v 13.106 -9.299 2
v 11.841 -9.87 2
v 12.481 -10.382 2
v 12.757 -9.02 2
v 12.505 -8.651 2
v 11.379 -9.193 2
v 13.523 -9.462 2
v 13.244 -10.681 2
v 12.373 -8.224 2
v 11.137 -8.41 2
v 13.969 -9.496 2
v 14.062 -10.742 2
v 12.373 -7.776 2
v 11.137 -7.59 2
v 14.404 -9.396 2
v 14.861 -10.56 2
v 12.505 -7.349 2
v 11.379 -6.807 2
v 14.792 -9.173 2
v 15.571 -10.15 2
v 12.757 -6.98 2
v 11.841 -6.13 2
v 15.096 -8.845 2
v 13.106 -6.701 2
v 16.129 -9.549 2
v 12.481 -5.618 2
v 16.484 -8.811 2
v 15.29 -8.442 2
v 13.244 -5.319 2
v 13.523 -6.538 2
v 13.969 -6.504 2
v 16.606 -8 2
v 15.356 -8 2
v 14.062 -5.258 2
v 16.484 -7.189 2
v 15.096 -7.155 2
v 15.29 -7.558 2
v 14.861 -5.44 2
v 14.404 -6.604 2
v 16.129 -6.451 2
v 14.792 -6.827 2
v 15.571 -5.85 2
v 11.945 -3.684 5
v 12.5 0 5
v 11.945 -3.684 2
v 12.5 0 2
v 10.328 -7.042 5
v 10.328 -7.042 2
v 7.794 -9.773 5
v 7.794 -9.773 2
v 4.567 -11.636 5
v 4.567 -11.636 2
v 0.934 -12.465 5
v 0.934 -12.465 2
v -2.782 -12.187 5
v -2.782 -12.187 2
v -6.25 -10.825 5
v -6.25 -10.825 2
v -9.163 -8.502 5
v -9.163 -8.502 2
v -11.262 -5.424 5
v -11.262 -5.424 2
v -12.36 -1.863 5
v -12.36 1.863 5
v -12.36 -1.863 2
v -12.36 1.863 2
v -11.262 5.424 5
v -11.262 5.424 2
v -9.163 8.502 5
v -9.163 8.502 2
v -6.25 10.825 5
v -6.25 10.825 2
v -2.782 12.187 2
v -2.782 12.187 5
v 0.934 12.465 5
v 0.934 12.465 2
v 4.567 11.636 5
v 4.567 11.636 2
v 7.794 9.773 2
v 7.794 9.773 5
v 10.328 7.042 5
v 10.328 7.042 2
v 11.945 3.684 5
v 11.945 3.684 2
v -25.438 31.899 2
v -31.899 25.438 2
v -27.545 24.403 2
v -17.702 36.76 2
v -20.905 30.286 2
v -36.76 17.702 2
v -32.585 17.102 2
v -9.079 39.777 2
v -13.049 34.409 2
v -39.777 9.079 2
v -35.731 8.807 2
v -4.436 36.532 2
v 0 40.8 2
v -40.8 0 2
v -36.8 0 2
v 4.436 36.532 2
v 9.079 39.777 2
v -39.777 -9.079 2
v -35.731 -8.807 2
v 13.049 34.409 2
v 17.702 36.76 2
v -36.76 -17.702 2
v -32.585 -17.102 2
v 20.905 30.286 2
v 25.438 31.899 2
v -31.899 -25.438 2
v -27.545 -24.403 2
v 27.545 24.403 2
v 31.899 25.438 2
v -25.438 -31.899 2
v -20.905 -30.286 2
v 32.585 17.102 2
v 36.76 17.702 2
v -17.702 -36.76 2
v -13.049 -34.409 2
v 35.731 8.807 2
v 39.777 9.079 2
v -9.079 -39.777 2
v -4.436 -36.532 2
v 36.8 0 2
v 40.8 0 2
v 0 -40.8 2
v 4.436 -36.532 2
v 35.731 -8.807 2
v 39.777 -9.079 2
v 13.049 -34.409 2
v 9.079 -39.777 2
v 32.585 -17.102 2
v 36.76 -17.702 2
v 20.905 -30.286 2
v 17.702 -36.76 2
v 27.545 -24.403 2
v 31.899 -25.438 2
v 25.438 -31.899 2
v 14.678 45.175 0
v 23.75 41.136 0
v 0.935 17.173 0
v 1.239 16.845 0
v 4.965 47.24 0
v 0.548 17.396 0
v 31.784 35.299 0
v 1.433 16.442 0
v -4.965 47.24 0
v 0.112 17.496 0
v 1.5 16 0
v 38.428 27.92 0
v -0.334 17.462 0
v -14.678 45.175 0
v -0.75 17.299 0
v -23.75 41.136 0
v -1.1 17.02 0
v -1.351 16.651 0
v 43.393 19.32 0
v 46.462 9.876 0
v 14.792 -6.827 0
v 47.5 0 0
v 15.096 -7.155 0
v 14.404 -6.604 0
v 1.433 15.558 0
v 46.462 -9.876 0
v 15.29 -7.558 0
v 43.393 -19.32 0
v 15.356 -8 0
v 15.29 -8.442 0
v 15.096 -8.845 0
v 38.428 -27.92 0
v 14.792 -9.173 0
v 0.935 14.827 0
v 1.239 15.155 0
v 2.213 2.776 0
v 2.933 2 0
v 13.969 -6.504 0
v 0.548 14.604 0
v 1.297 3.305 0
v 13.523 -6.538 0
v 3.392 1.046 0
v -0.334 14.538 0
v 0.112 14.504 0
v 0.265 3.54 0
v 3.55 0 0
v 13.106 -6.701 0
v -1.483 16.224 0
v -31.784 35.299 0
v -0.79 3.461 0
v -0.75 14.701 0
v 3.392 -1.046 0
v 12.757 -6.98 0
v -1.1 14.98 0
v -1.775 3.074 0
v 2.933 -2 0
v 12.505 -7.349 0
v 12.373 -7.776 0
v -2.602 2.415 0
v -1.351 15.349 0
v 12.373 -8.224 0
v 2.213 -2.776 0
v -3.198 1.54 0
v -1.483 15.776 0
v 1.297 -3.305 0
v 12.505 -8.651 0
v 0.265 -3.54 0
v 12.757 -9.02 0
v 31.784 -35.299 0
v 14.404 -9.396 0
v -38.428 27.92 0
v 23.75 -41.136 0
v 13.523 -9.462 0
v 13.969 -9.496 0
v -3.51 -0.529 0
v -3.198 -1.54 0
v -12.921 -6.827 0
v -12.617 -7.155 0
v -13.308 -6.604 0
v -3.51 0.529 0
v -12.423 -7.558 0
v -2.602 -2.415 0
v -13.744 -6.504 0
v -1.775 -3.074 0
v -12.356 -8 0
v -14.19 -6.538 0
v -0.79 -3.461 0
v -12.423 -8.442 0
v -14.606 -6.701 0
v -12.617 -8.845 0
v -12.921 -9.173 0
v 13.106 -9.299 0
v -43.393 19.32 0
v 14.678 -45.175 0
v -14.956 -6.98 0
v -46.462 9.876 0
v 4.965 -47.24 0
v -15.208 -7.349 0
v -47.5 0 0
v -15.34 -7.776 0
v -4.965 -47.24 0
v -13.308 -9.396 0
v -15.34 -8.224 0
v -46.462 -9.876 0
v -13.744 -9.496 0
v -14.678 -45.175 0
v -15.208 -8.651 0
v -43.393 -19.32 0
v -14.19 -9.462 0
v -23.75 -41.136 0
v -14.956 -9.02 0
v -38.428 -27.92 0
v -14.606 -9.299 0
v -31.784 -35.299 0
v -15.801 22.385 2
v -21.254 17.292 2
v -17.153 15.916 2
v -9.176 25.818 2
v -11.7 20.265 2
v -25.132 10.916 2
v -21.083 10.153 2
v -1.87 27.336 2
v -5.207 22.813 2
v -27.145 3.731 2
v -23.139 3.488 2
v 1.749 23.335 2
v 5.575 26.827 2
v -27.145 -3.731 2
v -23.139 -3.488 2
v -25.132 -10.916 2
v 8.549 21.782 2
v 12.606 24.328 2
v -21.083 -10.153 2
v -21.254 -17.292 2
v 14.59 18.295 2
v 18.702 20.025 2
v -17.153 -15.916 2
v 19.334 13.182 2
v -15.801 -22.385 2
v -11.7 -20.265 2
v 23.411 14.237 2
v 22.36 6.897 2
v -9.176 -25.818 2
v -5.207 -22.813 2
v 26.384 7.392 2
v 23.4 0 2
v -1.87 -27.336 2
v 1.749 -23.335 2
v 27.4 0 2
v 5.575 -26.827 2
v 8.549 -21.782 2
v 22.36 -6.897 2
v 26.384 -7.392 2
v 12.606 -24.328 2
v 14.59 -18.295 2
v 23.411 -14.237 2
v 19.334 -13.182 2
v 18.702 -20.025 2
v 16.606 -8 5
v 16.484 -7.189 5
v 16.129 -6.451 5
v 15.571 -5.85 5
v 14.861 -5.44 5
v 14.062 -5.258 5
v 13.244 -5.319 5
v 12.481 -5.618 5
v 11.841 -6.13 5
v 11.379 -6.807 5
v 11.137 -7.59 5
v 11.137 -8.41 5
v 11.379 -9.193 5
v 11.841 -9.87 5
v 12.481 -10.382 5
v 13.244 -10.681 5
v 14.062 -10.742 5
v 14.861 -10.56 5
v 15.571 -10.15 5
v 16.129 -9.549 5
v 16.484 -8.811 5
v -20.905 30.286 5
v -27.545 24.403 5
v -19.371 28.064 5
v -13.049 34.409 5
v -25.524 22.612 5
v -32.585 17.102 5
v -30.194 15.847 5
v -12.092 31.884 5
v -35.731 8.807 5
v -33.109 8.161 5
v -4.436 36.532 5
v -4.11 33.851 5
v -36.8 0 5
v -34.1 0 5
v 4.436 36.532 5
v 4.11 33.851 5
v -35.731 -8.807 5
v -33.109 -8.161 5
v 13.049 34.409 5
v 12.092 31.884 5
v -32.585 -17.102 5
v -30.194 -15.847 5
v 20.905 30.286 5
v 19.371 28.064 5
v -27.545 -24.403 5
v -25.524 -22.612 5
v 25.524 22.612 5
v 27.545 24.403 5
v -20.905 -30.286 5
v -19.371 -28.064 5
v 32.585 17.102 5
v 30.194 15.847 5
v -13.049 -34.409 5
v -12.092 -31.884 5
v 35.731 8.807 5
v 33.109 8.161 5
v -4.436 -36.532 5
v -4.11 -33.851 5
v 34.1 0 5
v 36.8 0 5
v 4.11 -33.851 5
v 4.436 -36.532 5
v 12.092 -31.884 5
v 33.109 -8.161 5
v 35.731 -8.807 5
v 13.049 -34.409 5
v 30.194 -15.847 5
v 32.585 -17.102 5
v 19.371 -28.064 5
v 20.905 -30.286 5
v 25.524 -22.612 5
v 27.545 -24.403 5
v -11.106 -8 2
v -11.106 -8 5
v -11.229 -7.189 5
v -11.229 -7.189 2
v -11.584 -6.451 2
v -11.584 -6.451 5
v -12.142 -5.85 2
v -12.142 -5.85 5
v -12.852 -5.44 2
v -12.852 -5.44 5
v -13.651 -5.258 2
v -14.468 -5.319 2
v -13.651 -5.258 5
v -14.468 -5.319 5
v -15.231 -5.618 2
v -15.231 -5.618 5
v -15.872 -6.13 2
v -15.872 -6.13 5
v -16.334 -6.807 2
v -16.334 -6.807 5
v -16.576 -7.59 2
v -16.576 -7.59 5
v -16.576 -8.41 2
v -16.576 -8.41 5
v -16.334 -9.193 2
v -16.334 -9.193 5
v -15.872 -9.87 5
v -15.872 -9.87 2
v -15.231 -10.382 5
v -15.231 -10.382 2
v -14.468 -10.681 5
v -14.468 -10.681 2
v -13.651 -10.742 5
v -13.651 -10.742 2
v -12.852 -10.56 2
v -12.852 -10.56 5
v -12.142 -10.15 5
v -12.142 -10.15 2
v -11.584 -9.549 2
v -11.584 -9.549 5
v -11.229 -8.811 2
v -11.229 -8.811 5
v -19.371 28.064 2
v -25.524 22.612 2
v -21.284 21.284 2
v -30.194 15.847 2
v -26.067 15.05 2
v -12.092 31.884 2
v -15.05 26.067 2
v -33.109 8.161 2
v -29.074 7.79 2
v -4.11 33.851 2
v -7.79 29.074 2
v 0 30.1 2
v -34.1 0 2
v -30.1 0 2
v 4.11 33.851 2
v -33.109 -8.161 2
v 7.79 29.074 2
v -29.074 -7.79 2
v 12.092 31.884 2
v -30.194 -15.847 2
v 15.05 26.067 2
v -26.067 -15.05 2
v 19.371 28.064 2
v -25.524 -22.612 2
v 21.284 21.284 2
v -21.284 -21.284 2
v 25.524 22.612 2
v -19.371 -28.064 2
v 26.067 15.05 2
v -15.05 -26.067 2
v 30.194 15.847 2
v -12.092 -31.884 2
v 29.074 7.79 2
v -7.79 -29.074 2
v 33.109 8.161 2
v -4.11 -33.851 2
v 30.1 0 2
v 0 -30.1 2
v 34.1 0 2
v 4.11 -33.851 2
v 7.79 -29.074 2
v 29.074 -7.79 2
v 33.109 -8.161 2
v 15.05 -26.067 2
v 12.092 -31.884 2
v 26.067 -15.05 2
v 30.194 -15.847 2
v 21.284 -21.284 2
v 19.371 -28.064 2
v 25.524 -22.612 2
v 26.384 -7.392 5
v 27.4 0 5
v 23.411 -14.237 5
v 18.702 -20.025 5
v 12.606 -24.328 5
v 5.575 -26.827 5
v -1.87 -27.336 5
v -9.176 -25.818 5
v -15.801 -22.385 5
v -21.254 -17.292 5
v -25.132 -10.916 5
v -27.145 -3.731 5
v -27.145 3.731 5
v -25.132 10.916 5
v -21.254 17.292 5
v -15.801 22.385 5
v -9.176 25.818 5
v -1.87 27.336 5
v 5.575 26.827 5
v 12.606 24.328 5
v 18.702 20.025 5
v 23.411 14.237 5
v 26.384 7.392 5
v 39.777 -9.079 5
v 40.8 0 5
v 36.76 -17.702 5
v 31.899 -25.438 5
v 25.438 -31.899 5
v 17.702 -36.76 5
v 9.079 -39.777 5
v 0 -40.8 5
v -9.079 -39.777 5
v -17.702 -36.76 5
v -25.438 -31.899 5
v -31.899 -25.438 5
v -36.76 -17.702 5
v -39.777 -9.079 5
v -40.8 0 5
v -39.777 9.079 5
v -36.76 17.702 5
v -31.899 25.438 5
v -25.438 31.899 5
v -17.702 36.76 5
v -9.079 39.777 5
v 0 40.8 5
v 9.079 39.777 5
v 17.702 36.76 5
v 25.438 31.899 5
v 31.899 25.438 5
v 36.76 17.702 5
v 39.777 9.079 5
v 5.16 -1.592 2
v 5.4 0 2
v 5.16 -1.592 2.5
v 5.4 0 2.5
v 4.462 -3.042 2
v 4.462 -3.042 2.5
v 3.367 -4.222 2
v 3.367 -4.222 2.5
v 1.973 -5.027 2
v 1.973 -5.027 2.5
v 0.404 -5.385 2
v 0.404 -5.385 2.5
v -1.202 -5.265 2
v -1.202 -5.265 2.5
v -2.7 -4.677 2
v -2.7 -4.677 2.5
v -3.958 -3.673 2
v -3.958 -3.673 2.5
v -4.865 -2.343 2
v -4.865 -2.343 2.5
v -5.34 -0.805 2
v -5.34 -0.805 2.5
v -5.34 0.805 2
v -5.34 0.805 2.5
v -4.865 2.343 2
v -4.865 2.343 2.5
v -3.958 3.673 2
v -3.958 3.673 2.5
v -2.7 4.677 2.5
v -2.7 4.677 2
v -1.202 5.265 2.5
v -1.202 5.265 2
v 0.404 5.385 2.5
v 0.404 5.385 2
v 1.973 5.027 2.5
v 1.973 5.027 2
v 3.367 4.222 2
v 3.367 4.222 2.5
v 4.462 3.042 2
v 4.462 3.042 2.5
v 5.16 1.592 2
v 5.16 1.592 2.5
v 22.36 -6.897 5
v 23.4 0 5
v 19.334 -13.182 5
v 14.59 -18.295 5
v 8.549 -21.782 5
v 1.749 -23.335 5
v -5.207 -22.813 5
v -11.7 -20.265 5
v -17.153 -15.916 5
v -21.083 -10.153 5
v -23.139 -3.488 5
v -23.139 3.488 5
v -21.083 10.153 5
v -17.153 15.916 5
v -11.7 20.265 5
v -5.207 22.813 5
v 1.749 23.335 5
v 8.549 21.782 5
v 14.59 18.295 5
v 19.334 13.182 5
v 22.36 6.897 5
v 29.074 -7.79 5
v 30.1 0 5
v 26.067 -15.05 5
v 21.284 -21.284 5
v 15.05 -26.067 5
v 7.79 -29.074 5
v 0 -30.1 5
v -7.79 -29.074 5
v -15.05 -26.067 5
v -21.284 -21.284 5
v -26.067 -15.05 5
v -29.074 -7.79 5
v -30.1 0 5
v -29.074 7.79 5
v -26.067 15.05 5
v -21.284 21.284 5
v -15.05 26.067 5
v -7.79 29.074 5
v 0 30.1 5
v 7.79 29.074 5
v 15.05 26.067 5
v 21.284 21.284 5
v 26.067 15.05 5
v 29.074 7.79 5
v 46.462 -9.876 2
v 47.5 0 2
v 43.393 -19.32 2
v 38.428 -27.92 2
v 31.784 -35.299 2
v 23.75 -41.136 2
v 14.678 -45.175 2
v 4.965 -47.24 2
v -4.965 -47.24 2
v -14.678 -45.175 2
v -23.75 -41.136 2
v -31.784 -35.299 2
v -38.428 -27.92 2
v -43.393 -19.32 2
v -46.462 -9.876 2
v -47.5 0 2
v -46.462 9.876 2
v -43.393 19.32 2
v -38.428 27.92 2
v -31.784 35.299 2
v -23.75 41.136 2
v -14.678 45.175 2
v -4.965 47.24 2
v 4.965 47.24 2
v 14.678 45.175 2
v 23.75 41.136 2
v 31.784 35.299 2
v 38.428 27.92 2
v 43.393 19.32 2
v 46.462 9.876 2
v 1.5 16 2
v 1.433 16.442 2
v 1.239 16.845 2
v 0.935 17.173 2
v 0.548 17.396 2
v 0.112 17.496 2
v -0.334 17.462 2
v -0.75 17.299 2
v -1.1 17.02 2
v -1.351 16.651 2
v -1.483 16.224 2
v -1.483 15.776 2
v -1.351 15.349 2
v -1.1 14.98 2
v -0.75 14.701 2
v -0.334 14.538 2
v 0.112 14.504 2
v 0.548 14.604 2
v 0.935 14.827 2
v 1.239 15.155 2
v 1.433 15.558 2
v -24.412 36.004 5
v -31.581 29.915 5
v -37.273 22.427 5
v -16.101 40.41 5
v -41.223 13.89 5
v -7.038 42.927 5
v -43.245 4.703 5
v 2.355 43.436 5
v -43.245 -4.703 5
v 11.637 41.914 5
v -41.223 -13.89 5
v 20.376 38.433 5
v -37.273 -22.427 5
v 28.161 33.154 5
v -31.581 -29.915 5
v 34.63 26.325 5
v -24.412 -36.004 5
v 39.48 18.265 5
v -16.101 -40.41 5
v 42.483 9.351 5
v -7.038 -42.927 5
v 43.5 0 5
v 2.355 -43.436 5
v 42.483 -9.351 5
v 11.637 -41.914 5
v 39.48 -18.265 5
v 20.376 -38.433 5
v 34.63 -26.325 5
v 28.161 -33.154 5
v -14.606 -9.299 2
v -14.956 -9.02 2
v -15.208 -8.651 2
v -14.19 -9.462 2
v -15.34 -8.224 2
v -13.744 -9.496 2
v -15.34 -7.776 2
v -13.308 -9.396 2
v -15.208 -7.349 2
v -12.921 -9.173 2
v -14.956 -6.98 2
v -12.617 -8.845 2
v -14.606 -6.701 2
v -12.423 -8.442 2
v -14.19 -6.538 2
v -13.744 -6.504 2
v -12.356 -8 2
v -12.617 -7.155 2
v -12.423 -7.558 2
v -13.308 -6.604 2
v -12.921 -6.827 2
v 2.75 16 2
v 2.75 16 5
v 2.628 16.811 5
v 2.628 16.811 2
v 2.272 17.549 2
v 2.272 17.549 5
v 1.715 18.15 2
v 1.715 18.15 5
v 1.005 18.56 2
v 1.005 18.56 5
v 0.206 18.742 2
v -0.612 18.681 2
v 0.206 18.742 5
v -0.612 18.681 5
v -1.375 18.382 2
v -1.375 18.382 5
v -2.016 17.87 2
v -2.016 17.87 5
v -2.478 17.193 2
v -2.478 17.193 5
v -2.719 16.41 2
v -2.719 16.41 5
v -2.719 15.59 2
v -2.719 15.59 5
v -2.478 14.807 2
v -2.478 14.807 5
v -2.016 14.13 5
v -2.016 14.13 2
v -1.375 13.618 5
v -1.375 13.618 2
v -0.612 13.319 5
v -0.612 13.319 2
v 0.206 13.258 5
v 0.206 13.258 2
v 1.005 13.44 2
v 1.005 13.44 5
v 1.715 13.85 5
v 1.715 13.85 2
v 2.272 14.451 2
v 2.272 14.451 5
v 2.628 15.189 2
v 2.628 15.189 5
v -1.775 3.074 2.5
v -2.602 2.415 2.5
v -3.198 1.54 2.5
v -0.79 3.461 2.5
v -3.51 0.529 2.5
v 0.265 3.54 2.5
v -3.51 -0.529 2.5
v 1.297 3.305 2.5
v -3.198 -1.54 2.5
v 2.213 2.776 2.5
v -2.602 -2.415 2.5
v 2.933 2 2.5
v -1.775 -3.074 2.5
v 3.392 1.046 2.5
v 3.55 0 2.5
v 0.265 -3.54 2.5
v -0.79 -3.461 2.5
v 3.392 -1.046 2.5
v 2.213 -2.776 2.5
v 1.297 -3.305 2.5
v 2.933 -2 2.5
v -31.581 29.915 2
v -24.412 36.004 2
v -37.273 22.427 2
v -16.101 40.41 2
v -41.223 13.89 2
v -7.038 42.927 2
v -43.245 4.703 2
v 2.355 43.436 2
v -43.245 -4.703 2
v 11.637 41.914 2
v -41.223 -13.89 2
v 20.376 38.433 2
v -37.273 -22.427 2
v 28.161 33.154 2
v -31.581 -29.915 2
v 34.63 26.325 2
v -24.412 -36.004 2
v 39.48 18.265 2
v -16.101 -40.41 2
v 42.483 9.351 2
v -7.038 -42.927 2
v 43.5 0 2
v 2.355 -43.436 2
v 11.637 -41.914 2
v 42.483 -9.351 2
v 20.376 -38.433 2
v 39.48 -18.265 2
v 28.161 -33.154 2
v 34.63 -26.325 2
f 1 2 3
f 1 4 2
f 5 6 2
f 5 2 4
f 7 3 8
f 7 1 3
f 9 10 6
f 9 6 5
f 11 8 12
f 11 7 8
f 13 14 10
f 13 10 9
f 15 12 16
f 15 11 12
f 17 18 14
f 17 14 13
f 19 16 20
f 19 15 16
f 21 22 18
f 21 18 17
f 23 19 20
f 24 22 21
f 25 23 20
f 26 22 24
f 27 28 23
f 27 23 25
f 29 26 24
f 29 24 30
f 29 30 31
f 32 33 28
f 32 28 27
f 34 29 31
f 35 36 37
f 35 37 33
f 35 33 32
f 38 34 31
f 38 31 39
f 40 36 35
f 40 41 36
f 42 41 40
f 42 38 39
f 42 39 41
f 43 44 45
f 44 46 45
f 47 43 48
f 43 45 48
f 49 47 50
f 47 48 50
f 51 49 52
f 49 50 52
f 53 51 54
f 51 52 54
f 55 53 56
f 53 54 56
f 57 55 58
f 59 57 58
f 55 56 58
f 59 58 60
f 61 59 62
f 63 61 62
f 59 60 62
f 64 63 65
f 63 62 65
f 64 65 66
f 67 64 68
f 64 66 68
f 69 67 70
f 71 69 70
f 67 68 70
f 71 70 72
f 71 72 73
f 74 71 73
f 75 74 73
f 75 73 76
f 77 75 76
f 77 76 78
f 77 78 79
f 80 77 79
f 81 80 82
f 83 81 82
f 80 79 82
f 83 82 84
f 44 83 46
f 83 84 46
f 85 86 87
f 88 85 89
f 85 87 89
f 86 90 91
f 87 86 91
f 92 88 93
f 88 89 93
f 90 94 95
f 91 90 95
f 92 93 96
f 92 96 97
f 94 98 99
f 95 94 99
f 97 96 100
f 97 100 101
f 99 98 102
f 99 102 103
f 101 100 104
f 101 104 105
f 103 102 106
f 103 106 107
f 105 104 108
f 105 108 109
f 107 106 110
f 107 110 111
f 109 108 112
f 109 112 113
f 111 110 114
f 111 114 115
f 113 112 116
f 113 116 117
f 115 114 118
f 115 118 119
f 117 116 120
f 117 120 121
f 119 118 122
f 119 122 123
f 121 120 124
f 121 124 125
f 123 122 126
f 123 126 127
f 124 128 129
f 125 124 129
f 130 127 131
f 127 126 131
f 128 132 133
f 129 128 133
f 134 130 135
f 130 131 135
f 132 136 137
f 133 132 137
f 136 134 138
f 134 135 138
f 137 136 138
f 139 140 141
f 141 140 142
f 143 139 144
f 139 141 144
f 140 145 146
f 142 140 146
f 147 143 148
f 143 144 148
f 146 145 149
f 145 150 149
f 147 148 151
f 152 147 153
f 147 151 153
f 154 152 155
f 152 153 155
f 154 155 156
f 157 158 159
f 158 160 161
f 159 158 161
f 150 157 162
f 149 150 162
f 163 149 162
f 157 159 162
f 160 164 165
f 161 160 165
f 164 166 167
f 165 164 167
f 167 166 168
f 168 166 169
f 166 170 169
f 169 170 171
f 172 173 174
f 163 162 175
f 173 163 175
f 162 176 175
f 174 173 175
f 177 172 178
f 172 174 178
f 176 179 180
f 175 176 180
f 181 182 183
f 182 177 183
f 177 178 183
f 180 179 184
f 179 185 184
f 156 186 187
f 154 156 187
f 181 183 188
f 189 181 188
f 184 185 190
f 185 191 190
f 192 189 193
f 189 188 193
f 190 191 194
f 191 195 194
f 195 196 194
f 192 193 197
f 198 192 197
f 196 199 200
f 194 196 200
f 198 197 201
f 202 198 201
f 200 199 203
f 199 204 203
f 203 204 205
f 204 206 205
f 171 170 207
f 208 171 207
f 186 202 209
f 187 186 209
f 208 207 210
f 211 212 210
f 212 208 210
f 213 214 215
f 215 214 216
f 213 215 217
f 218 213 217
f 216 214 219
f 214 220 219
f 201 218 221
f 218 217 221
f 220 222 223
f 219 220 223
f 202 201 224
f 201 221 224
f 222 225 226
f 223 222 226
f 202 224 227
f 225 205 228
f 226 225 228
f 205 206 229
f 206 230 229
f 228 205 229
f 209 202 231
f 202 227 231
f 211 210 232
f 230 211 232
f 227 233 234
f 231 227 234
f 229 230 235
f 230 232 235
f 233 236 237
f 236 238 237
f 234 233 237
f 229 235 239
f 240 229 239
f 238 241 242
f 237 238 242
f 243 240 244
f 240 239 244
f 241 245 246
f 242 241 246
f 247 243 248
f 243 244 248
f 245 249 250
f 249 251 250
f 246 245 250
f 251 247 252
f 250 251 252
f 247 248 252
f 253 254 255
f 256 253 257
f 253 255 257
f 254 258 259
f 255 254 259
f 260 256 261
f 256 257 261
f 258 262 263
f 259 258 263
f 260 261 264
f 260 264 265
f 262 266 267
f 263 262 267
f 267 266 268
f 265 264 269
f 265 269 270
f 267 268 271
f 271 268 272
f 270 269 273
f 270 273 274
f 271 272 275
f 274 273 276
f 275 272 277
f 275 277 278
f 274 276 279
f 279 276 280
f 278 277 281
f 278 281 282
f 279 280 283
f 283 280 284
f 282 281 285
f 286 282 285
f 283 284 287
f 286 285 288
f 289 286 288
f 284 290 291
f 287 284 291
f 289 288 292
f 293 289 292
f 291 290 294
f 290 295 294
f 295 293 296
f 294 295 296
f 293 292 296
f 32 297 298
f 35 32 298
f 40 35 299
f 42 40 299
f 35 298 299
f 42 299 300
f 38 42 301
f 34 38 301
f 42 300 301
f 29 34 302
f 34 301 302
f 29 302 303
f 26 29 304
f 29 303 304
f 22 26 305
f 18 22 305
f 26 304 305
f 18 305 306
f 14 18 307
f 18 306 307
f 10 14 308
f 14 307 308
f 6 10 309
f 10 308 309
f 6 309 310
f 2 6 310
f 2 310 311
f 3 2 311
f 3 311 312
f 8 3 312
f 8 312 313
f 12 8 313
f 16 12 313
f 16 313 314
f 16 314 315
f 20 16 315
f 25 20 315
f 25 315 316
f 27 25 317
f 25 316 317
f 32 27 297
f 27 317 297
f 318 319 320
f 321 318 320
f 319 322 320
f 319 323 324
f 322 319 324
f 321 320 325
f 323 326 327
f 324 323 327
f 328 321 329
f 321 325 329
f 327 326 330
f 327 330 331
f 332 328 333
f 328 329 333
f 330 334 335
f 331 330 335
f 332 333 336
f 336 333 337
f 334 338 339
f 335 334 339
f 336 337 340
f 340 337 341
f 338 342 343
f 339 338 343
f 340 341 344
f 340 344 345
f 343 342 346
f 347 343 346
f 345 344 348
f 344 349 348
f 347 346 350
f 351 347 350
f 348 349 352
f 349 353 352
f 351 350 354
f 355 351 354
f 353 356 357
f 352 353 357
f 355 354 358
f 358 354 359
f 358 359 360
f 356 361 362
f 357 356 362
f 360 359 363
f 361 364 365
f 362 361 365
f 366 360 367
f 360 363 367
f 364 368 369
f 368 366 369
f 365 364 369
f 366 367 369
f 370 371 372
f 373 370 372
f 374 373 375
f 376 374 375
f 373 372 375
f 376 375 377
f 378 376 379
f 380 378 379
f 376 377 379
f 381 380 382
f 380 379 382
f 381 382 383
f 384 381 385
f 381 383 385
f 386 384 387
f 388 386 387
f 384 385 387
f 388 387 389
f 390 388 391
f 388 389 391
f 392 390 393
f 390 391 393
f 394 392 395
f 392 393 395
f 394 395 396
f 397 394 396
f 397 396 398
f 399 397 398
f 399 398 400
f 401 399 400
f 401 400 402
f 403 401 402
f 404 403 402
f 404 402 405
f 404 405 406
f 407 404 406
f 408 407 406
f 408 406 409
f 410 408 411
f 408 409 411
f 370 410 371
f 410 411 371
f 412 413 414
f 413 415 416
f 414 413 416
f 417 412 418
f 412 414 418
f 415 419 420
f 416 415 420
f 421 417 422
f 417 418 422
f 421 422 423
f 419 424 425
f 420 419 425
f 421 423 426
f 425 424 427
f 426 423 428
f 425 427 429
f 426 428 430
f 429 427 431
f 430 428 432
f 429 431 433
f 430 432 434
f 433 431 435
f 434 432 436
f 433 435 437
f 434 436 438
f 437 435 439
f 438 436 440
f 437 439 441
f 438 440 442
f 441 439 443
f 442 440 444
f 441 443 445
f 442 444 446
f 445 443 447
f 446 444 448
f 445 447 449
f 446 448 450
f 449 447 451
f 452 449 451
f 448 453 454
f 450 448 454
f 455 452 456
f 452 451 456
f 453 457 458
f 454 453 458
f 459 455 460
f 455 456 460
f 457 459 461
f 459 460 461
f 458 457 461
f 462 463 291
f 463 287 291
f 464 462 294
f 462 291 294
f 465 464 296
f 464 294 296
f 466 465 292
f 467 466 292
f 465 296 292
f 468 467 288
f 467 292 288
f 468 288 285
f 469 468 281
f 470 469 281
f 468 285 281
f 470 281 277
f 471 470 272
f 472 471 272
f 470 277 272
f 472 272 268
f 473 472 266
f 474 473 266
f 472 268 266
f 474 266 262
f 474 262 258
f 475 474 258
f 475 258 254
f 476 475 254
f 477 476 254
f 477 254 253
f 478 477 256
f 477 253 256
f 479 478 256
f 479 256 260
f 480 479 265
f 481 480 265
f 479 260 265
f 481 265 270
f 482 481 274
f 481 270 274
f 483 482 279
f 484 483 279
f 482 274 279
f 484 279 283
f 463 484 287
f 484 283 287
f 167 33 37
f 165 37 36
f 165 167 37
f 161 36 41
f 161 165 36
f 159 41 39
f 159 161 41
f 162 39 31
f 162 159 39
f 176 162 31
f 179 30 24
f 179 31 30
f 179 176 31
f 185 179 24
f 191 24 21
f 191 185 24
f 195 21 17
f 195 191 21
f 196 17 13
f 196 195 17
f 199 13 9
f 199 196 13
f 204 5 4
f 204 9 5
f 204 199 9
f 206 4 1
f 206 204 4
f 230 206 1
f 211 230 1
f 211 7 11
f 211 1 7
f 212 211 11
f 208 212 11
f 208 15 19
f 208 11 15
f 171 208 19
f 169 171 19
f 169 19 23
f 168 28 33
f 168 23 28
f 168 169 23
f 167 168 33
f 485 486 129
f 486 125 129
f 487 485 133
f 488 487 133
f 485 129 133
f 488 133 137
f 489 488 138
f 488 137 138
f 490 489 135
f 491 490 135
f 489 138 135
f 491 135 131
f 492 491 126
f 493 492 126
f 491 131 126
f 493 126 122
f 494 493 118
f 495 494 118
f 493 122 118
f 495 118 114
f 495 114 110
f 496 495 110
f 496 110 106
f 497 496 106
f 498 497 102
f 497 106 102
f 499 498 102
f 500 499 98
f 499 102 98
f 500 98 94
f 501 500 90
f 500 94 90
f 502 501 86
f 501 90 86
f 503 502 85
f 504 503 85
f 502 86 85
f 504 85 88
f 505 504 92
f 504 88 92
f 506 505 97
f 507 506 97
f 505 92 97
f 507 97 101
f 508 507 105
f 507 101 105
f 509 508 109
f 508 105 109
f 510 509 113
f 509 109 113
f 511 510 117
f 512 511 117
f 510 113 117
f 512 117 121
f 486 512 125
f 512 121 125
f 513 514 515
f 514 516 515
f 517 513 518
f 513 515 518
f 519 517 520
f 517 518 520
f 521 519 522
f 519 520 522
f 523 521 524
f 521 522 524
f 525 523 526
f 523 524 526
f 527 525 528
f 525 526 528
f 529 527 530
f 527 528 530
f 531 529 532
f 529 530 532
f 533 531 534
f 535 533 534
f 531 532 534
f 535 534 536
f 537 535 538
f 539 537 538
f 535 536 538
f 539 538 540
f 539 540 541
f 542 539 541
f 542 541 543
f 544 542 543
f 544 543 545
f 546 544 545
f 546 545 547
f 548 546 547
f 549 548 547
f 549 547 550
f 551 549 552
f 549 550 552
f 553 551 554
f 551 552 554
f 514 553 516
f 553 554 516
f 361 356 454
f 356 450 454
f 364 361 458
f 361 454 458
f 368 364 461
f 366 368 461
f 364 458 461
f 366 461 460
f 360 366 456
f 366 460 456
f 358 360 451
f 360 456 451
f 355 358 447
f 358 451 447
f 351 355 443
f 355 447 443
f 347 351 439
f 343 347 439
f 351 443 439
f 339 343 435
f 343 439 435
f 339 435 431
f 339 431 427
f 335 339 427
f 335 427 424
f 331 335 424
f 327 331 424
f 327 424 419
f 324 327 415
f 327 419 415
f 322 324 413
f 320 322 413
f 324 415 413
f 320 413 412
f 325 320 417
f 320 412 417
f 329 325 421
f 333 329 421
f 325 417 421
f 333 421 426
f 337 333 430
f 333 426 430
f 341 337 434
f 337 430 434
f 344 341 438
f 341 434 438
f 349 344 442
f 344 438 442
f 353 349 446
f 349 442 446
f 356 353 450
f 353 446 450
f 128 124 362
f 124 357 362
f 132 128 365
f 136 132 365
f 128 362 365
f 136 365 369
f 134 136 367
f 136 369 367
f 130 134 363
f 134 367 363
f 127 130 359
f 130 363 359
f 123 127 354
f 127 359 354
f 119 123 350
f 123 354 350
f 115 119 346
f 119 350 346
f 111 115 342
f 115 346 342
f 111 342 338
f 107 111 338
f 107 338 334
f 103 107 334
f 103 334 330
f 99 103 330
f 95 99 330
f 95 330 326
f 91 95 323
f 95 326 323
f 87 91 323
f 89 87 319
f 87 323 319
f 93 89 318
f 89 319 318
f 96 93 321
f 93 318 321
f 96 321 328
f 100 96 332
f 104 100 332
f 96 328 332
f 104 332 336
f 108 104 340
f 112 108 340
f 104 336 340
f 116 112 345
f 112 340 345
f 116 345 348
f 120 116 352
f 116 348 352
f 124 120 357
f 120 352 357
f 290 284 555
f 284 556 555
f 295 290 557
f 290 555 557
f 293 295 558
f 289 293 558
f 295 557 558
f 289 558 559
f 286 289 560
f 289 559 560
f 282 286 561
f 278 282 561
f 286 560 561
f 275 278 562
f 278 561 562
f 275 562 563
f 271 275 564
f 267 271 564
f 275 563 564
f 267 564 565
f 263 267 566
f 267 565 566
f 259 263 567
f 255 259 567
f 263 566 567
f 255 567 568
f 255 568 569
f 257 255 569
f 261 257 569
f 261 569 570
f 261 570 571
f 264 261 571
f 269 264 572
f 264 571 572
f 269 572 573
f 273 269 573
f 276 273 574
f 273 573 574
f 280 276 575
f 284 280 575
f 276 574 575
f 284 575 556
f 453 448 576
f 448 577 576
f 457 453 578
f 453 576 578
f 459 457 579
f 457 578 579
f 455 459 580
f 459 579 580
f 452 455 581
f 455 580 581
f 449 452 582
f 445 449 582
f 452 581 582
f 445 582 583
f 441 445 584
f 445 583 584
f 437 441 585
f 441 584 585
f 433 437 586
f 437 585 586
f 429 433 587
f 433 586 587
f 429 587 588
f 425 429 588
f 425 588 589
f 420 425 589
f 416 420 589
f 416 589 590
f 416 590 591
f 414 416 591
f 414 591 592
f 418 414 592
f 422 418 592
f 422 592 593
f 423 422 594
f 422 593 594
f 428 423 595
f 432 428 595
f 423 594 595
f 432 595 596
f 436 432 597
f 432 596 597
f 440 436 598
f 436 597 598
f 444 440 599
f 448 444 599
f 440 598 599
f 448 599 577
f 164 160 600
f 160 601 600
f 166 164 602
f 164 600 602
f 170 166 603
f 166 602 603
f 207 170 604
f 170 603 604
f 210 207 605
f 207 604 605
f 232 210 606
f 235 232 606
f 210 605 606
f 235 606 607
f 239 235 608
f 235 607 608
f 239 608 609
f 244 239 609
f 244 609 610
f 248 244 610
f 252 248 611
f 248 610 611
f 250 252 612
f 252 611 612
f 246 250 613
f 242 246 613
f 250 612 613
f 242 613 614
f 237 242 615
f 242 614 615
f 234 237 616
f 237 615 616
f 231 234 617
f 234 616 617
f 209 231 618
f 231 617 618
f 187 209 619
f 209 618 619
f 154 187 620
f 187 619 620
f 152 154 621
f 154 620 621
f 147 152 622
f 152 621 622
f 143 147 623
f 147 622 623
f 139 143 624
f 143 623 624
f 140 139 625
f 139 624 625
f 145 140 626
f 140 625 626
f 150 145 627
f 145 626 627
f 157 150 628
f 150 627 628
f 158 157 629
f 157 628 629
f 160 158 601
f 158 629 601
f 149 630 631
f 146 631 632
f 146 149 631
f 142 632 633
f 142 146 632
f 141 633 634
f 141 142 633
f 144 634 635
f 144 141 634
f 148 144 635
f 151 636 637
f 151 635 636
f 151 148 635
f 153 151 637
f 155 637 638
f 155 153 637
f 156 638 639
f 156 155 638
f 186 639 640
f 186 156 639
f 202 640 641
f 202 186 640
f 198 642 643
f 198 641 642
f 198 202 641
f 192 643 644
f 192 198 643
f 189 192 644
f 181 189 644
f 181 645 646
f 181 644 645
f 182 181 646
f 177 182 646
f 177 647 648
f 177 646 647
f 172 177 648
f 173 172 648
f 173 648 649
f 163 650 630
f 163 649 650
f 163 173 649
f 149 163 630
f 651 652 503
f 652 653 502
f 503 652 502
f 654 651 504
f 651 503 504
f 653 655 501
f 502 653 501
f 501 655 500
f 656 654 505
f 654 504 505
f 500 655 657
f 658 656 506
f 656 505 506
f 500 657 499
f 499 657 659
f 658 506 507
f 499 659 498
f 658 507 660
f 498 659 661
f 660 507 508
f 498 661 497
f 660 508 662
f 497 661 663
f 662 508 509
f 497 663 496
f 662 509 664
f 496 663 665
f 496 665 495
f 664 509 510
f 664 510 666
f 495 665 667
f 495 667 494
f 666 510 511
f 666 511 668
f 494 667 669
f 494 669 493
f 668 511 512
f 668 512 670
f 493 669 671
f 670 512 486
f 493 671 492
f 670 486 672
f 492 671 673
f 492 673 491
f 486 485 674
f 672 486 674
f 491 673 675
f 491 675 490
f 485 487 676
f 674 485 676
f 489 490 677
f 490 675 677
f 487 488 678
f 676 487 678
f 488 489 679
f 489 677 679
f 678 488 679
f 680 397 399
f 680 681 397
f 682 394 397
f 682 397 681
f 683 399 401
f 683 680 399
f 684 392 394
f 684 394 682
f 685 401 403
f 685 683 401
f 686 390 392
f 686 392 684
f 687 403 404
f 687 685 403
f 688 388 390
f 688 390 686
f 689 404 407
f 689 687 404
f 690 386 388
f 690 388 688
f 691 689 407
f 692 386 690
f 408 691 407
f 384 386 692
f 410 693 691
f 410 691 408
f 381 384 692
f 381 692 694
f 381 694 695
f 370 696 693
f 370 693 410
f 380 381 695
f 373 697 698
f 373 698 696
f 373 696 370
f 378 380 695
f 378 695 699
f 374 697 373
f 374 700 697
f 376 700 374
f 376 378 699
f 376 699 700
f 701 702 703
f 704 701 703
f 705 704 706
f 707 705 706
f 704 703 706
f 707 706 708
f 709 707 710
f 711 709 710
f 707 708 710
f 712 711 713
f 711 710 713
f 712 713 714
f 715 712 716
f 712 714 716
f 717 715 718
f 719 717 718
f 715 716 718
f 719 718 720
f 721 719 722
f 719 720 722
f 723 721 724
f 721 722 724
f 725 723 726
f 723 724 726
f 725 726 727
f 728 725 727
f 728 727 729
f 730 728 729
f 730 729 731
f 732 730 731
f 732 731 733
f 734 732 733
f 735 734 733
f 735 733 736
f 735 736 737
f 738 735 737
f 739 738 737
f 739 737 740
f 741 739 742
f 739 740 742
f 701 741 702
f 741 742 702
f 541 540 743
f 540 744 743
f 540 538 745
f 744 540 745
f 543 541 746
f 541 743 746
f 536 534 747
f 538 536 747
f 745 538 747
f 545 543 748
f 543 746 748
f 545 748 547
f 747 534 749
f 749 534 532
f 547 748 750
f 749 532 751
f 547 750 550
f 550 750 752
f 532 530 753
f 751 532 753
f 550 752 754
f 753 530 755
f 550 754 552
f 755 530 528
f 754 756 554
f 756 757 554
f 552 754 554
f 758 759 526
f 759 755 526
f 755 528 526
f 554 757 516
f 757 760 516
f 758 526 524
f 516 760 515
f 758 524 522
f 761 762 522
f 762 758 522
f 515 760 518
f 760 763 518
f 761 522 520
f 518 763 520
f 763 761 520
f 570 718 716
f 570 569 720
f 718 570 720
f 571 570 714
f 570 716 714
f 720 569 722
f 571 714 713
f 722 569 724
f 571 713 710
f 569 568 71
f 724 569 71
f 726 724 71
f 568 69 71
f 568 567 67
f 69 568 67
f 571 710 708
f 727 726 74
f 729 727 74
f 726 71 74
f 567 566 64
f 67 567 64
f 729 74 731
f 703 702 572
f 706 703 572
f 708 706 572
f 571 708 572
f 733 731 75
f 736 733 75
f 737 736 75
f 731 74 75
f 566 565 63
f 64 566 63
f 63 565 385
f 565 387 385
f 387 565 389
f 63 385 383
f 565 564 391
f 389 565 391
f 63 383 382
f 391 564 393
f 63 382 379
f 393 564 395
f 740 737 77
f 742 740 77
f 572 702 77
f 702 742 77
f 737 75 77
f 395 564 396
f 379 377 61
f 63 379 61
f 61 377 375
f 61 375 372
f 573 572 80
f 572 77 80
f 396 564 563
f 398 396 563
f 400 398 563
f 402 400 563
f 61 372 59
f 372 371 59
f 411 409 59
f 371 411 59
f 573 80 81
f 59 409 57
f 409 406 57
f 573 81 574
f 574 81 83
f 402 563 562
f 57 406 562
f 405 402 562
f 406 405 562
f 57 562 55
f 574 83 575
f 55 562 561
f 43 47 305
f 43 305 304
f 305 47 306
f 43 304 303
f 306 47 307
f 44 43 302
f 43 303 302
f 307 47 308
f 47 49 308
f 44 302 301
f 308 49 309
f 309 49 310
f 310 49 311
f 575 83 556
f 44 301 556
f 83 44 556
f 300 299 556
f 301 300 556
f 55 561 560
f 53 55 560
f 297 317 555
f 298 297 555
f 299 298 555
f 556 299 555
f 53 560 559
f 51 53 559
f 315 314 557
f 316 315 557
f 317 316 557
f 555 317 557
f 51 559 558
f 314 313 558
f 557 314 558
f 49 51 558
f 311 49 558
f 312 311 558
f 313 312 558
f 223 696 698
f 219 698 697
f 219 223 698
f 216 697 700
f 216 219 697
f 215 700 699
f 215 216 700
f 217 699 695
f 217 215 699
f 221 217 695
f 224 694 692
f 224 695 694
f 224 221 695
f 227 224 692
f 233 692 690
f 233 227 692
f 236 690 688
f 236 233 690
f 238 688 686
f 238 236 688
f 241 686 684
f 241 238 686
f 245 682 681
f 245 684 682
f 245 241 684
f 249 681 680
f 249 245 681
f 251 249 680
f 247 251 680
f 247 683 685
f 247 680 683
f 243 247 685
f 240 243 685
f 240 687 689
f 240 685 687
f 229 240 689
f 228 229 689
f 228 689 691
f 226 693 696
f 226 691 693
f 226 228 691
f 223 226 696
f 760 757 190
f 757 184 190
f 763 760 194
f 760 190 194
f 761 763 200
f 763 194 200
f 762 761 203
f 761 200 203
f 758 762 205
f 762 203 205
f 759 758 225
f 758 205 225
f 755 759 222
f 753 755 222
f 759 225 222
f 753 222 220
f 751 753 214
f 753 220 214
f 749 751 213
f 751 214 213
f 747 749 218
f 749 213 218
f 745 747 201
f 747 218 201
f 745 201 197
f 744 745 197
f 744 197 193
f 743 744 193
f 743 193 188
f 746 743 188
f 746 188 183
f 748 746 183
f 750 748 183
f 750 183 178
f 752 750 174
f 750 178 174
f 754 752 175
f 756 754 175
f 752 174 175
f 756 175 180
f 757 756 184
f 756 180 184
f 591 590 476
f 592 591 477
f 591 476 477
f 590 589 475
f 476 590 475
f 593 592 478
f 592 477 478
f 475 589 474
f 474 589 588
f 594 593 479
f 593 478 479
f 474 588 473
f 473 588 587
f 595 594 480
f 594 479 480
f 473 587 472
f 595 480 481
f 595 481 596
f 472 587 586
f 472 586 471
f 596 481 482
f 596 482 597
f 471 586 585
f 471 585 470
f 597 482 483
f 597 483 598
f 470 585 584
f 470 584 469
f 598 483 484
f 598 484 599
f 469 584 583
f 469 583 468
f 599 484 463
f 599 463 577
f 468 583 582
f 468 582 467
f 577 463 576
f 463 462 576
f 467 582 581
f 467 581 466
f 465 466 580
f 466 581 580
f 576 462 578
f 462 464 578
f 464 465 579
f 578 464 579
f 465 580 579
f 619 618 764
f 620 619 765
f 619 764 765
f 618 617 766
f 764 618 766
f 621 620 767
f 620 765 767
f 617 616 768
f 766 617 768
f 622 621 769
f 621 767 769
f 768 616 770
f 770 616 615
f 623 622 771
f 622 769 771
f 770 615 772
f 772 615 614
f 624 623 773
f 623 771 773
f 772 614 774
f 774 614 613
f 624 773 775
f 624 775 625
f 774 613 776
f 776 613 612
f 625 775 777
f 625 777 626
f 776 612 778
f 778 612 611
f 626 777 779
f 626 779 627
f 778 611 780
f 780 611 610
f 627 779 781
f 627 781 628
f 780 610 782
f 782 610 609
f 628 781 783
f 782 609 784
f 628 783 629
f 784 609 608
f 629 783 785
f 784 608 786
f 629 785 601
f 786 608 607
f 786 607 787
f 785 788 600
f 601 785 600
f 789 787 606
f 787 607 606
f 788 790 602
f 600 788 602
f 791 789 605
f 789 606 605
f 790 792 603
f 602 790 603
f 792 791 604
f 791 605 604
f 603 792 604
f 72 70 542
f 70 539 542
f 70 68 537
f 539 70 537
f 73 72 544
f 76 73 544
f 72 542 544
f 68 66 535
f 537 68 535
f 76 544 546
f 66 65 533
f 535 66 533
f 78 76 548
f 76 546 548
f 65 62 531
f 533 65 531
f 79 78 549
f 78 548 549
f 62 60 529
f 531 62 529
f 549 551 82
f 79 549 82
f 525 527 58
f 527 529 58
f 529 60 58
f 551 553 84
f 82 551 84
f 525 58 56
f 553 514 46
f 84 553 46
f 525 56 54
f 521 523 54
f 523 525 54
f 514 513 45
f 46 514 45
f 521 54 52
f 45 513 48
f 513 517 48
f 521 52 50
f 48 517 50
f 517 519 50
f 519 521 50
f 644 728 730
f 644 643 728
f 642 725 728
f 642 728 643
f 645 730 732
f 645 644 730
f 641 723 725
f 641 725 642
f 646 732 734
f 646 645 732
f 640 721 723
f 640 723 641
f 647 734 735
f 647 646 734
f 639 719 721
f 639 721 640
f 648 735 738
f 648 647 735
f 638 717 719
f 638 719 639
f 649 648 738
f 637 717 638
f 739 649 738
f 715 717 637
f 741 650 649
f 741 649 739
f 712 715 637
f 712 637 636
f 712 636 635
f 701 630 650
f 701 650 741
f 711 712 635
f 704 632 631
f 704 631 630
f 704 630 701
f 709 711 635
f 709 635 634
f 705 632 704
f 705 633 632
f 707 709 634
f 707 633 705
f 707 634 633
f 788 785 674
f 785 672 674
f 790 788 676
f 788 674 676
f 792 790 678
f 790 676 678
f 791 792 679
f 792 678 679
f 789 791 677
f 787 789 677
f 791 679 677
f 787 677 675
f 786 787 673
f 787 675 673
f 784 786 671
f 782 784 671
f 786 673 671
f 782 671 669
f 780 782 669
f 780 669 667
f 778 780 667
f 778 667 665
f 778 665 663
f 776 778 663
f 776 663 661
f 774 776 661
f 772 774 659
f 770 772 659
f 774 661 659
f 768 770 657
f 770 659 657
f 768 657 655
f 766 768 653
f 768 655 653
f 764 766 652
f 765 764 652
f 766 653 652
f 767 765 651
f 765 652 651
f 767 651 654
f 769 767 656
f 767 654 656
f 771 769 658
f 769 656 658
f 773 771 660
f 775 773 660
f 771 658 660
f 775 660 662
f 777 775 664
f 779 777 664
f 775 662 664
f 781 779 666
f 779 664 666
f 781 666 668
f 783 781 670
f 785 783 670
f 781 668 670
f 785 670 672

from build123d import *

# Parameters (mm, degrees)
F2_R     = 1.5
F3_DEPTH = 5.001
F4_R     = 2.75
F5_DEPTH = 3


with BuildPart() as f1:
    # F0 (on Front) → F1 (revolve)
    with BuildSketch(Plane.XZ):
        Polygon((3.55, 2.5), (3.55, 0), (47.5, 0), (47.5, 2), (43.5, 2), (43.5, 5), (40.8, 5), (40.8, 2), (36.8, 2), (36.8, 5), (34.1, 5), (34.1, 2), (30.1, 2), (30.1, 5), (27.4, 5), (27.4, 2), (23.4, 2), (23.4, 5), (12.5, 5), (12.5, 2), (5.4, 2), (5.4, 2.5), align=None)
    revolve(axis=Axis((0, 0, 0.333373), (0, 0, -1)))

    # F2 (on Top) → F3 (cut, through all)
    with BuildSketch(Plane.XY):
        with Locations((0, 16)):
            Circle(F2_R)
        with Locations((-13.856406, -8)):
            Circle(F2_R)
        with Locations((13.856406, -8)):
            Circle(F2_R)
    extrude(amount=F3_DEPTH, mode=Mode.SUBTRACT)

    # F4 (on face) → F5 (cut)
    with BuildSketch(Plane.XY.offset(5)):
        with Locations((0, 16)):
            Circle(F4_R)
        with Locations((-13.856406, -8)):
            Circle(F4_R)
        with Locations((13.856406, -8)):
            Circle(F4_R)
    extrude(amount=-F5_DEPTH, mode=Mode.SUBTRACT)


solid = f1.part
